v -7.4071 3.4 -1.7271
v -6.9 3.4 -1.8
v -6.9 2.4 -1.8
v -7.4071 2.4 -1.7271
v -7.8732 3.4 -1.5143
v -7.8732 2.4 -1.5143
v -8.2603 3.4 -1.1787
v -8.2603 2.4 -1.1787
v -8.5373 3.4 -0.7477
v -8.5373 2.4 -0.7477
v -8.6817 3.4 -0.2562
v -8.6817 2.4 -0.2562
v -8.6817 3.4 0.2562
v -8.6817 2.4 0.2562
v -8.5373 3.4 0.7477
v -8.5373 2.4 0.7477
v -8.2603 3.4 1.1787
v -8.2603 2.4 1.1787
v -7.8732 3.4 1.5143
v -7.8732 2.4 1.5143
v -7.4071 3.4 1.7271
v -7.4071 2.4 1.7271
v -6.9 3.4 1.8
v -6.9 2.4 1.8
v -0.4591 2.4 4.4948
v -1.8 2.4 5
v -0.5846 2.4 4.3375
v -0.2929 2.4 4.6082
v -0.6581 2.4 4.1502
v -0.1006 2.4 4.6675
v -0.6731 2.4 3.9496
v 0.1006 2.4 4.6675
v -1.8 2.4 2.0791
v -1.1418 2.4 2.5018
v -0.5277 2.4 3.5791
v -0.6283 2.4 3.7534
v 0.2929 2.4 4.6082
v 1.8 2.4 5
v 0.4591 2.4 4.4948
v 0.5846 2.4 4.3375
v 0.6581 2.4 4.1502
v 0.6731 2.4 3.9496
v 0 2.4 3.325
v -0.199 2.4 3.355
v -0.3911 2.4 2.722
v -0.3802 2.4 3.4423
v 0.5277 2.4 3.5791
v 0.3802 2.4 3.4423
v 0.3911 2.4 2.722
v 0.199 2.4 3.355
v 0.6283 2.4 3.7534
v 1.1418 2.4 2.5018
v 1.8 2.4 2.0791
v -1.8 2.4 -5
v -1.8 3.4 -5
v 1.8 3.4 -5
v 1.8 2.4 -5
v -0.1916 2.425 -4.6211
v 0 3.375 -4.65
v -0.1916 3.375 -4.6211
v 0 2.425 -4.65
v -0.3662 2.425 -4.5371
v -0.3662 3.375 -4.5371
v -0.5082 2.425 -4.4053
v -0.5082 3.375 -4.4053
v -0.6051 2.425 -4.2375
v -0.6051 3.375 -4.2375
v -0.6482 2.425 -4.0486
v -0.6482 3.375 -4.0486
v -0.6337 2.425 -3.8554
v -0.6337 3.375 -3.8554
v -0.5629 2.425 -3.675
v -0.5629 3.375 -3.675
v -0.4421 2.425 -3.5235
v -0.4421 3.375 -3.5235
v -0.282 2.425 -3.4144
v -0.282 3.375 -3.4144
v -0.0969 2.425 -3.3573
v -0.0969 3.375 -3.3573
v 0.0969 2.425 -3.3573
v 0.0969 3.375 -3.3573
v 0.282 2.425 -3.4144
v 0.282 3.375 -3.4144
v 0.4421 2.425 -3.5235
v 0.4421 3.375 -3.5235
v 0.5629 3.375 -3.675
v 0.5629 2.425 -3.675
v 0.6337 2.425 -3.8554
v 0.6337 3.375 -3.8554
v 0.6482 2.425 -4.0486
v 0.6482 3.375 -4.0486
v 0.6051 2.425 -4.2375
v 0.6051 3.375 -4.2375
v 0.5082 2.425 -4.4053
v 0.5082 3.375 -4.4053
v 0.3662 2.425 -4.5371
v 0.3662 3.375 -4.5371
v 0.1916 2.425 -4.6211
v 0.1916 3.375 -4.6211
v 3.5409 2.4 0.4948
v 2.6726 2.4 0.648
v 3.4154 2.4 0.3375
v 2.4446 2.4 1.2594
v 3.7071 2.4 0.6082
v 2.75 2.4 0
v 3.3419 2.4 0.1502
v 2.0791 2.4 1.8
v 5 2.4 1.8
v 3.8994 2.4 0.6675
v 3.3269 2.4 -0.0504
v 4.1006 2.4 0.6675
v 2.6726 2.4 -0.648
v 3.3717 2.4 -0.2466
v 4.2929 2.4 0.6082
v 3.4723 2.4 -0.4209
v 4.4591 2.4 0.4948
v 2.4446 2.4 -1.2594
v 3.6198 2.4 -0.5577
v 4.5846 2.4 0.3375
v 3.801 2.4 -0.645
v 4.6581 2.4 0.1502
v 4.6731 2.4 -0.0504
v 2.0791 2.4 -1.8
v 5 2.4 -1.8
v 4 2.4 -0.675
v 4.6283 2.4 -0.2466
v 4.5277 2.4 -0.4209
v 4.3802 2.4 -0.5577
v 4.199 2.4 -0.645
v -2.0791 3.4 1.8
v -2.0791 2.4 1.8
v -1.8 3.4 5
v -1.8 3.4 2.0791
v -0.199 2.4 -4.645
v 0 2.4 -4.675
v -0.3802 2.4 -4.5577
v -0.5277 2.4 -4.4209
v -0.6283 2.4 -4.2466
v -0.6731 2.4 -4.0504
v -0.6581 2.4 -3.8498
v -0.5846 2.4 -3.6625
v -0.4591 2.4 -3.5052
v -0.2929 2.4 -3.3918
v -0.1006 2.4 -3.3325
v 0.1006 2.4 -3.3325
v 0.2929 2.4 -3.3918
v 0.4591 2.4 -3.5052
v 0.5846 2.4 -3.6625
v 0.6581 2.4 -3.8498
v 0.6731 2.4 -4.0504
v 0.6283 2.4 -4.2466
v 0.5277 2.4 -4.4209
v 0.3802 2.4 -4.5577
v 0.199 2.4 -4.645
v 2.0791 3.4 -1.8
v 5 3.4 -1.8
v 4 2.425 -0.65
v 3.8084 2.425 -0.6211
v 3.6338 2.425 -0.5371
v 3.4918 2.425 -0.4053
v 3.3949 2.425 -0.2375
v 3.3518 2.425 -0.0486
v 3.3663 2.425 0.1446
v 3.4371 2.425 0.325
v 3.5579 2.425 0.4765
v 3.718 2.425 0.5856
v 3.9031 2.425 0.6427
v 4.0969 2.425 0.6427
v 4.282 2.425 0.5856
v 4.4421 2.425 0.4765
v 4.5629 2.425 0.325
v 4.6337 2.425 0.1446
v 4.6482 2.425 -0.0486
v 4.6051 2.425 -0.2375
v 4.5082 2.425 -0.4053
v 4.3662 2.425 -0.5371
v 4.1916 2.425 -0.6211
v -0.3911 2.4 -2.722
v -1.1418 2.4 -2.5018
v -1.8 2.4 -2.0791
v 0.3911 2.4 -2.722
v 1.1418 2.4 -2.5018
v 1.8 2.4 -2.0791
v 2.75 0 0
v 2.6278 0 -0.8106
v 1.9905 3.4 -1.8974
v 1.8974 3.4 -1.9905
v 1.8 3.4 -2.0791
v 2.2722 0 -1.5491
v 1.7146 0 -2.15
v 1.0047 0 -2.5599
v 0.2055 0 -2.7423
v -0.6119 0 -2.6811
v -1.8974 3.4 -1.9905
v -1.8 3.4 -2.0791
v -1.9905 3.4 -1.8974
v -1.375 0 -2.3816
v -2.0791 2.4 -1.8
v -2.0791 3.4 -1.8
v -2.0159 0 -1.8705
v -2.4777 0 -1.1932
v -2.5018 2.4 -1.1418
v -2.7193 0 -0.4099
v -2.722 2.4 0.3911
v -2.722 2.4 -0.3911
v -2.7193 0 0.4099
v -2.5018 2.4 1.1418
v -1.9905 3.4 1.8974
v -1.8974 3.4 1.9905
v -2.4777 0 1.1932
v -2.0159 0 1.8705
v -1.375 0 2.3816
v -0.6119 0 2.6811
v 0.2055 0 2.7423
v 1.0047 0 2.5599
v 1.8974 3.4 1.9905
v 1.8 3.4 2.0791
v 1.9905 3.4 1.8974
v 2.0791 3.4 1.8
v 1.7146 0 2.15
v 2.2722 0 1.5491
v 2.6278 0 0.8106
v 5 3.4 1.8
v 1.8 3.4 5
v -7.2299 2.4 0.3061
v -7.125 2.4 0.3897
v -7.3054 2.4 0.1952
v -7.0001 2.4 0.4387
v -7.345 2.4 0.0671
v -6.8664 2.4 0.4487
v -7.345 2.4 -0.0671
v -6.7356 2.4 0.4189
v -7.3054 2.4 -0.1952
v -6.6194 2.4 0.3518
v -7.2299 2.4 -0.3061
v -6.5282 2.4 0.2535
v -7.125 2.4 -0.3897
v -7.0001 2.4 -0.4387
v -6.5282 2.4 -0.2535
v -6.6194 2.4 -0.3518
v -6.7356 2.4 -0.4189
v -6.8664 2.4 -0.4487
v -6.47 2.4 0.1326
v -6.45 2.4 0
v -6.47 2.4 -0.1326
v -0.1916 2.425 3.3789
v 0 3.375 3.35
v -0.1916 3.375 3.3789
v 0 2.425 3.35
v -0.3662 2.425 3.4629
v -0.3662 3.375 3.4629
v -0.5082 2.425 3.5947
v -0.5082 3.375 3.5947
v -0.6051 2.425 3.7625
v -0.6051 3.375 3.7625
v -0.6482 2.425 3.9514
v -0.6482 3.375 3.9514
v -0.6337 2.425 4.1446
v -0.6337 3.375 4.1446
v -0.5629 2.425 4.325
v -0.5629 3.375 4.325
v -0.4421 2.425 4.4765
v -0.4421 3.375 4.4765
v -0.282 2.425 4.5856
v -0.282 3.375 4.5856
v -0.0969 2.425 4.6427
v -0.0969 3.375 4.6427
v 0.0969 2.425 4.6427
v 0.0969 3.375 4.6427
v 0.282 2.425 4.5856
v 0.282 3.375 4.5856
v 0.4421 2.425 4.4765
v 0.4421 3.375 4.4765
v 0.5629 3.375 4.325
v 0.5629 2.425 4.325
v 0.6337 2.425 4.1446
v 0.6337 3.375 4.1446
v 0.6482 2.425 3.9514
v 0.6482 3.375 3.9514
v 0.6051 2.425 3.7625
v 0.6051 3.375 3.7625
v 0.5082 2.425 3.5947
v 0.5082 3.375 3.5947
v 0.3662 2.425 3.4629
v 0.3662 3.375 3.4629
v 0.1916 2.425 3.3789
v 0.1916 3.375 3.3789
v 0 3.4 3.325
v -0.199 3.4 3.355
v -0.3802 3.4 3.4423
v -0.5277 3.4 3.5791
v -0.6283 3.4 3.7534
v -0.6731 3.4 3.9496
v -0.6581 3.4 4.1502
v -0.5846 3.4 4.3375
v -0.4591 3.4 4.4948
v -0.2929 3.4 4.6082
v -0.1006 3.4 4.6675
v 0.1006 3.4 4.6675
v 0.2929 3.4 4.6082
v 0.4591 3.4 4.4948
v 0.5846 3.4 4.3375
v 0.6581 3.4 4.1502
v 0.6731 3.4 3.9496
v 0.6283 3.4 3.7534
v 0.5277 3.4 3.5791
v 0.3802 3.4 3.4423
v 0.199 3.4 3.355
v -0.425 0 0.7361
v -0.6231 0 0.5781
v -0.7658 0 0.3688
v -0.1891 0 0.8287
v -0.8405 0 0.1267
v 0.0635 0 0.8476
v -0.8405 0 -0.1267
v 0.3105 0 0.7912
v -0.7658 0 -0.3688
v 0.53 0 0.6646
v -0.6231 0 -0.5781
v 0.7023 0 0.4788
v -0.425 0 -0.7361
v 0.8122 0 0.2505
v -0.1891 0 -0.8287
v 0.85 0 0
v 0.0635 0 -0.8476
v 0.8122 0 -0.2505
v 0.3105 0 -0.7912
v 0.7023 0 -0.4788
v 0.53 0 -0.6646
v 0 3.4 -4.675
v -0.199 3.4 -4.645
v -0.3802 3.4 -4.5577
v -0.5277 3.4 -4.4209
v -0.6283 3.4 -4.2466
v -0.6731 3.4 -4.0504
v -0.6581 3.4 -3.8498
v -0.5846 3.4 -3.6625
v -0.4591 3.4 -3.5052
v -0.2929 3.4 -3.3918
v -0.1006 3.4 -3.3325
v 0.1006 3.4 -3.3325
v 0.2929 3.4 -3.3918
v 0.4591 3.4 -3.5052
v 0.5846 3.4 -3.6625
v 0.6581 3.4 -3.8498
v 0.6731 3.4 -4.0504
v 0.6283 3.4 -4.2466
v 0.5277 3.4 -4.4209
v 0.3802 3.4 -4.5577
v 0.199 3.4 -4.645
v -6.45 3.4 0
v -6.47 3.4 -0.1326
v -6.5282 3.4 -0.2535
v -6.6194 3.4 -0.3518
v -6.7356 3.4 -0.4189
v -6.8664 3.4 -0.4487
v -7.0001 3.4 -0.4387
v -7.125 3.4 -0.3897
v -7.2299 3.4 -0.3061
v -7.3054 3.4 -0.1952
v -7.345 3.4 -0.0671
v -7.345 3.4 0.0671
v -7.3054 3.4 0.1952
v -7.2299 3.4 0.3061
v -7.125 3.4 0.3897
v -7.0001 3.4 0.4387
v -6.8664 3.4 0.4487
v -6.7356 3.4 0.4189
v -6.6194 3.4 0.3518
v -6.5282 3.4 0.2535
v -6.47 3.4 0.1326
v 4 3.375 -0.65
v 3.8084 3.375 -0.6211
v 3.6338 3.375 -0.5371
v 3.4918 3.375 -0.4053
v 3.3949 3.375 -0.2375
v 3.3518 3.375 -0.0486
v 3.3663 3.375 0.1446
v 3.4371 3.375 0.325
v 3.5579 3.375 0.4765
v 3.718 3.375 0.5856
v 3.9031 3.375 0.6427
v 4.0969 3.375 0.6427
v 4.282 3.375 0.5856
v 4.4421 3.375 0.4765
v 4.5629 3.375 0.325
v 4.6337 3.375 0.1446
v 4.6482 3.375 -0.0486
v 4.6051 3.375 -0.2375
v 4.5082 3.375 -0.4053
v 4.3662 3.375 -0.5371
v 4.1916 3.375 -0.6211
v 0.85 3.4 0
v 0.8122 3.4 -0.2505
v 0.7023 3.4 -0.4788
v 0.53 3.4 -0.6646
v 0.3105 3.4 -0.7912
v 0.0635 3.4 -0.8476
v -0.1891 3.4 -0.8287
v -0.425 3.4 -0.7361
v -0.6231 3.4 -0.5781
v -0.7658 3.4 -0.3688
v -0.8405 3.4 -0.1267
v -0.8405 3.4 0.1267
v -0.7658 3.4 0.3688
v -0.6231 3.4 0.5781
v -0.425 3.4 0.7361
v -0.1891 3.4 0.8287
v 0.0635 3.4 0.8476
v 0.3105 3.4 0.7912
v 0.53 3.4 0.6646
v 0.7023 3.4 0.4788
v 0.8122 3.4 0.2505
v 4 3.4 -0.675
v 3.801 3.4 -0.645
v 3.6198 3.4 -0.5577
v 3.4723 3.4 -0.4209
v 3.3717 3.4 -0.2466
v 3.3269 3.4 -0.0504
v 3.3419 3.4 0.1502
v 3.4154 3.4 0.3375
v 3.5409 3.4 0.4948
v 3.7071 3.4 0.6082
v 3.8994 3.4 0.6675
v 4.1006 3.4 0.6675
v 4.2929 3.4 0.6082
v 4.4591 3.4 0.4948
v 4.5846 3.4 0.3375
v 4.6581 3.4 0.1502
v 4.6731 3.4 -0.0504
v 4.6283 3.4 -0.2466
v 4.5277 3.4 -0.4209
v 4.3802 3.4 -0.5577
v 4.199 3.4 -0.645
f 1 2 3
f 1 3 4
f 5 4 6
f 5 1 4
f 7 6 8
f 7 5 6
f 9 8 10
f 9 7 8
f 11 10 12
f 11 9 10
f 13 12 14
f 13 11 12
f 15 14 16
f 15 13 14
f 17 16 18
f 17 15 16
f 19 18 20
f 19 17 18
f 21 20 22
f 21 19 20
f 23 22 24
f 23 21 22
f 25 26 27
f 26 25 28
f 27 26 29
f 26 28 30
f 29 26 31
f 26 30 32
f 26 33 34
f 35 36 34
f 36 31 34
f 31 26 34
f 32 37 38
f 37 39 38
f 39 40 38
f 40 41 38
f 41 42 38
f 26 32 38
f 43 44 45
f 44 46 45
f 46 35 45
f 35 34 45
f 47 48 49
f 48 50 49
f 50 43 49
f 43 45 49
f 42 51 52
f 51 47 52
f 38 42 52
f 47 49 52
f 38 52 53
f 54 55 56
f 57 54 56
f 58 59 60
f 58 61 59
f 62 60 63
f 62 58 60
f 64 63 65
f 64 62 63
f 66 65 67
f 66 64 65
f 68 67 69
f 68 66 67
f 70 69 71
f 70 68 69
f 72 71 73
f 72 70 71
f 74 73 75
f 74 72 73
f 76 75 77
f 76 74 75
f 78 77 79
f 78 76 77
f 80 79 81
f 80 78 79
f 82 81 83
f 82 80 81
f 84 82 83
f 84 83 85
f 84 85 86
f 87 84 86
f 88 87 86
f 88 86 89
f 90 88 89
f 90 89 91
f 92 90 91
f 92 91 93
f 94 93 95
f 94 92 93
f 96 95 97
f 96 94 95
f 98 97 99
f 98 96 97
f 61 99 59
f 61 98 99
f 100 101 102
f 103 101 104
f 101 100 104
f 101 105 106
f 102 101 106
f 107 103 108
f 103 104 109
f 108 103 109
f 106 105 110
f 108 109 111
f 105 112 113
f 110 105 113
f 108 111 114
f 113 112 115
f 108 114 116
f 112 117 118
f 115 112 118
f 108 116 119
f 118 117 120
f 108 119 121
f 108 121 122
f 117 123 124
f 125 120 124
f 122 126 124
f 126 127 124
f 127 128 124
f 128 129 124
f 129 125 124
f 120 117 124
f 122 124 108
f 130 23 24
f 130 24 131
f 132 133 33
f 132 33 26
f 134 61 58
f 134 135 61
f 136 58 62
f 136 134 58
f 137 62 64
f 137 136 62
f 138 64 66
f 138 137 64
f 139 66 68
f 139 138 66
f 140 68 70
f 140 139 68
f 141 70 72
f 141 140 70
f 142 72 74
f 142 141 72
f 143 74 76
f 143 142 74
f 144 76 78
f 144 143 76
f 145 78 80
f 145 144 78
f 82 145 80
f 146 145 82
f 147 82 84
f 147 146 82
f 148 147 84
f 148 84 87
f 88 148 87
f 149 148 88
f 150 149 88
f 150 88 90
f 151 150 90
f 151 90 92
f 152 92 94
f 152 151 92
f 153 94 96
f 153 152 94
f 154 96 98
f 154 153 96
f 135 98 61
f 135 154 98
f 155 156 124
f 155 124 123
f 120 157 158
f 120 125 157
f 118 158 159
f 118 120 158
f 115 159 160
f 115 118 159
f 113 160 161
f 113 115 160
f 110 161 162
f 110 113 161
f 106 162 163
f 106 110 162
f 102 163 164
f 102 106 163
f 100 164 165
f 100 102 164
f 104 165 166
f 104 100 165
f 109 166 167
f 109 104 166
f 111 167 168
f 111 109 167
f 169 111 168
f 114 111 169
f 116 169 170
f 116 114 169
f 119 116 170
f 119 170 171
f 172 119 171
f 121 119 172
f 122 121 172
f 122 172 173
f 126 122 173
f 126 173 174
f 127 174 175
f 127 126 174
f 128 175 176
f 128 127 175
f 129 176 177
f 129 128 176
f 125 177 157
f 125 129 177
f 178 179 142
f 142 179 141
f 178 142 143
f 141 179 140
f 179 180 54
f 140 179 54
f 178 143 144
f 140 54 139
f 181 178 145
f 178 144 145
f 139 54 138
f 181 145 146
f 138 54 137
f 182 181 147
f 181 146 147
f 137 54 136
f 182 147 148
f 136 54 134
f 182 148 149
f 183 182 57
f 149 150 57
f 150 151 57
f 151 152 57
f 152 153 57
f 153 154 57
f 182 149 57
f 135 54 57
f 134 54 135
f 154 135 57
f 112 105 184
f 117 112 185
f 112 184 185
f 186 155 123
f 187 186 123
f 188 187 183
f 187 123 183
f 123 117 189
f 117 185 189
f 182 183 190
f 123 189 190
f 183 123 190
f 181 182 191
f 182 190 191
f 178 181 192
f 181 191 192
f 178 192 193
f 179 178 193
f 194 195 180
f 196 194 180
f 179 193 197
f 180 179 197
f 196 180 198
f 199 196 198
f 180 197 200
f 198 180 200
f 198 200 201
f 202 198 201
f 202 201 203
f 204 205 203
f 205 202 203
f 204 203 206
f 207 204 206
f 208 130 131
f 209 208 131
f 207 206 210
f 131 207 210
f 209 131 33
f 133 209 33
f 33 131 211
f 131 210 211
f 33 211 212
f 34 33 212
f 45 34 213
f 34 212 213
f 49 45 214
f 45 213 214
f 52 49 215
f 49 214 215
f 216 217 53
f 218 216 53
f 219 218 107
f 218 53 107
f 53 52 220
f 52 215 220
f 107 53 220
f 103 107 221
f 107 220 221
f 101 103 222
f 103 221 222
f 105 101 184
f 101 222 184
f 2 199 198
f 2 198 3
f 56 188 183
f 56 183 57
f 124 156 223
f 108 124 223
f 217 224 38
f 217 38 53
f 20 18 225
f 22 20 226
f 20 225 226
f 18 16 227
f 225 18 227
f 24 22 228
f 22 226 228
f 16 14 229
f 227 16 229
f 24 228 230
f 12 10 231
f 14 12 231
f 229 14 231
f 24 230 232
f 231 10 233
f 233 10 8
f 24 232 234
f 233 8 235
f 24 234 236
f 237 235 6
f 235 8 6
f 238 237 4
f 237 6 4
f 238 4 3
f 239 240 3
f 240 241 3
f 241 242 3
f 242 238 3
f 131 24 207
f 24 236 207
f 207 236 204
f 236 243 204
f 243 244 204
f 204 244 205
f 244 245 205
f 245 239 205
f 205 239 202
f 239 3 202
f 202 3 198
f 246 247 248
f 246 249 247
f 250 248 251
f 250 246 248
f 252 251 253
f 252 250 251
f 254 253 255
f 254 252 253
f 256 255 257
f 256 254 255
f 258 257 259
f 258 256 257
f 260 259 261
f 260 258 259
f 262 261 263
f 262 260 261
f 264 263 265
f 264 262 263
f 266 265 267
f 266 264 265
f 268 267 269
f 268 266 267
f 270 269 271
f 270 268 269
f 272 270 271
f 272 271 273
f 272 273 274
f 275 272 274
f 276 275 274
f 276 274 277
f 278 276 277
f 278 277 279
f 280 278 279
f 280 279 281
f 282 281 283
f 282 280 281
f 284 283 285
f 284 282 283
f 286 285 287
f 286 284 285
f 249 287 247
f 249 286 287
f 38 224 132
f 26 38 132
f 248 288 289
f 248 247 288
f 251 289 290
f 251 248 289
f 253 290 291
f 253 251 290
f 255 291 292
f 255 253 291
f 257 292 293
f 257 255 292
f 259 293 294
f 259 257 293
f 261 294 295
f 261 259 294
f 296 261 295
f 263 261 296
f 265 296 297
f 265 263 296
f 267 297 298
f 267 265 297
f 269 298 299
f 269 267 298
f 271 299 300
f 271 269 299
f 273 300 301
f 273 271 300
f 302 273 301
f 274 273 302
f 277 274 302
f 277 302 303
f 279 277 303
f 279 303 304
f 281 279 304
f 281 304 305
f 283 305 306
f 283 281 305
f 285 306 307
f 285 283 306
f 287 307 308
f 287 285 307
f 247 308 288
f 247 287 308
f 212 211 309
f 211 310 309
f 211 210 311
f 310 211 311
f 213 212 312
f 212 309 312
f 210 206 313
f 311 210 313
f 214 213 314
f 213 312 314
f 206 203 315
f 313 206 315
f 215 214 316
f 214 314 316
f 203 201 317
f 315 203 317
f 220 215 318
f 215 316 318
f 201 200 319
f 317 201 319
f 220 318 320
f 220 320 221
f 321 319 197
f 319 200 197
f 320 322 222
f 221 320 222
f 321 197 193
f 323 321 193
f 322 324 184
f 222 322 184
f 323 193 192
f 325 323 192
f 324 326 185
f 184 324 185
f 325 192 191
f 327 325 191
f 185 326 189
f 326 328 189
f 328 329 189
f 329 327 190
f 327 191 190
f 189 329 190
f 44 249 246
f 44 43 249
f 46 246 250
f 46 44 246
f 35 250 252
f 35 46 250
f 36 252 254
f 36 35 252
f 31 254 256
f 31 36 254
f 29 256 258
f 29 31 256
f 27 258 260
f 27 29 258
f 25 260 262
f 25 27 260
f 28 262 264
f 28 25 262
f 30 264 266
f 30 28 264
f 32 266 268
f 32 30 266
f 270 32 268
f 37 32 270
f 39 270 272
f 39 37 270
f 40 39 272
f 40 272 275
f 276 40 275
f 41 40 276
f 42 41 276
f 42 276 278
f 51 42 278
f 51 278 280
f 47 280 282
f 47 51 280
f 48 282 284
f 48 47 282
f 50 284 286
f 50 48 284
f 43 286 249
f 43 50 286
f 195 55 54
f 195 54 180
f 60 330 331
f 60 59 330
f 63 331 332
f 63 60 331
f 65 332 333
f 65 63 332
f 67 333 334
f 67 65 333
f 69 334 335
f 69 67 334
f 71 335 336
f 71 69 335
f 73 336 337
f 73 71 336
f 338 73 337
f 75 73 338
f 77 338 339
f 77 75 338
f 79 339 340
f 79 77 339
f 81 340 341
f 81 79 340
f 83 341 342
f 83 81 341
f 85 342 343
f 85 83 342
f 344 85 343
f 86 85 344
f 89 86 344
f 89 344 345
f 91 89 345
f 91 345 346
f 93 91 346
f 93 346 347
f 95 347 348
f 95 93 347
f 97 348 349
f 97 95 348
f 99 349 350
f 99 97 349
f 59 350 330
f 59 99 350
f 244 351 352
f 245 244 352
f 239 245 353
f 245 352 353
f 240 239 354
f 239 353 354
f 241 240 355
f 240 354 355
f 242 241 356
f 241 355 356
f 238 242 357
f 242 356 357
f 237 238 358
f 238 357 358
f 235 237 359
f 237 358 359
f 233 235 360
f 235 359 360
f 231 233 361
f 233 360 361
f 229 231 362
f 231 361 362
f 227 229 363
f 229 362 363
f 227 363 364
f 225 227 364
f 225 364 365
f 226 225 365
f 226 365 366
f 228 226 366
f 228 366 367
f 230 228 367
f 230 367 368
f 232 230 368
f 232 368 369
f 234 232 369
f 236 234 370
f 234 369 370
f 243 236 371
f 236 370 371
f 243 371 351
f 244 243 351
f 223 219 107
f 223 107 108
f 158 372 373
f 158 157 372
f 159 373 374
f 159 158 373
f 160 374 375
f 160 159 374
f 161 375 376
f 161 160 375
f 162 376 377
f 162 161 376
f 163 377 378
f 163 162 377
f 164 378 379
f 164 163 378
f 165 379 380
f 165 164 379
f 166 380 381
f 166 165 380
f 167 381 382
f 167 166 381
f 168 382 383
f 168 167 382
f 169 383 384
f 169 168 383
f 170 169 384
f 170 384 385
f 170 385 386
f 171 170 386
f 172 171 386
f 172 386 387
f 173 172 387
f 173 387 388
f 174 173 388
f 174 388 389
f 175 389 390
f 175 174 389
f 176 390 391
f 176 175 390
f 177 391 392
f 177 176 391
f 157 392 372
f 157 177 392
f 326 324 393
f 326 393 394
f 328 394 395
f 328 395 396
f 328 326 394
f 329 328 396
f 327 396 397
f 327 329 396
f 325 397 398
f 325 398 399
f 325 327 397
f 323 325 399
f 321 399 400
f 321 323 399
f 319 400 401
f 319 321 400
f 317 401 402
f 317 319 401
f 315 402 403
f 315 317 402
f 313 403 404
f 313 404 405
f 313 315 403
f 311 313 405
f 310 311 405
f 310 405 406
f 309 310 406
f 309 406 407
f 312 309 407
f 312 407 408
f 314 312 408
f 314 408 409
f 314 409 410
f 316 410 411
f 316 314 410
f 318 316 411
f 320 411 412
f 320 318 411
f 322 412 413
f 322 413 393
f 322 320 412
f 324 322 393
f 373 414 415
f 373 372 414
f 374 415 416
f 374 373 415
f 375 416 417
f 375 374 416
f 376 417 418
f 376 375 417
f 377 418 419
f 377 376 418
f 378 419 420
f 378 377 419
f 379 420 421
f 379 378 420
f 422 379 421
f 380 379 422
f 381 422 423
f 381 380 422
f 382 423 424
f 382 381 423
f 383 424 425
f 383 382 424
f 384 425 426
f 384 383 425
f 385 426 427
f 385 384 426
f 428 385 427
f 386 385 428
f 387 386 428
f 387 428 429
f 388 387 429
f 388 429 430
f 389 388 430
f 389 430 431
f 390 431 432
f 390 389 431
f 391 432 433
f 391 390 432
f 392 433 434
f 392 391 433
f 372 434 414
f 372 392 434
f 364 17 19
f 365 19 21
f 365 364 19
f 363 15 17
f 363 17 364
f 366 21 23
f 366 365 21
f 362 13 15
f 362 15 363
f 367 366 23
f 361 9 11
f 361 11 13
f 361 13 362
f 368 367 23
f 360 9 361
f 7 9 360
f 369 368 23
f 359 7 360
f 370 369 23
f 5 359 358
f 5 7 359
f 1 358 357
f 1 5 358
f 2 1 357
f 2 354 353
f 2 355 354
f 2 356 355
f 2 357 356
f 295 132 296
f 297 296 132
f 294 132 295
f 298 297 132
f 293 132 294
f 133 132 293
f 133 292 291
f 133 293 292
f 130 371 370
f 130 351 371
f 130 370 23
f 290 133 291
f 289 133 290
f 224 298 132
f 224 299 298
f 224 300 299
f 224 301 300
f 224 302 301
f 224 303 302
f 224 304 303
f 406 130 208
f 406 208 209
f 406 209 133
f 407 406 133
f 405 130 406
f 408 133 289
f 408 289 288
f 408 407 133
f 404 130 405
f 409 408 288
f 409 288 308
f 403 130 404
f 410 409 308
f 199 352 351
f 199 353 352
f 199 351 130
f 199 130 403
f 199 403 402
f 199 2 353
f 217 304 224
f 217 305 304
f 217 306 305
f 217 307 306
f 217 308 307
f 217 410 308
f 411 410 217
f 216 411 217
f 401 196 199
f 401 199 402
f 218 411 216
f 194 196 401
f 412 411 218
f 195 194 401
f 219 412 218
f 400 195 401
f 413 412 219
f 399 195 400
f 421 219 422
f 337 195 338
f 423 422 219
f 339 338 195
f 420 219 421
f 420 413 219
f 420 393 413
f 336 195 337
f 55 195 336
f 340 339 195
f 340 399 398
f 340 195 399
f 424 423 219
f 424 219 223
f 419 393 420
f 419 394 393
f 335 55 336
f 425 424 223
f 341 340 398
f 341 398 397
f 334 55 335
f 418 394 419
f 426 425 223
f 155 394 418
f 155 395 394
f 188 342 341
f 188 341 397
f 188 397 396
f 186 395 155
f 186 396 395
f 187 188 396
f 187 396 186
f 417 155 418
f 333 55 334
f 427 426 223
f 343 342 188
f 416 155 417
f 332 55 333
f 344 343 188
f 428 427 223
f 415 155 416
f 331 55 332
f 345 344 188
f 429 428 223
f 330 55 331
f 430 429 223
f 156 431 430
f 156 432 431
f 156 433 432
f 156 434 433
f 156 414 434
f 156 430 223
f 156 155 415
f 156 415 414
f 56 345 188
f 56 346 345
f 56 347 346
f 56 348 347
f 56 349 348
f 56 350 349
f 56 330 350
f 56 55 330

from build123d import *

# Parameters (mm, degrees)
SKETCH_1_R                       = 2.75
SKETCH_1_R_2                     = 0.85
EXTRUDE_1_DEPTH                  = 3.4
SKETCH_2_R                       = 0.45
EXTRUDE_2_DEPTH                  = 1
SKETCH_3_R                       = 0.45
CUT_EXTRUDE_1_DEPTH              = 4.4
HOLE_WIZARD_1_3_1_3_1_AT_2_COUNT = 2
HOLE_WIZARD_1_3_1_3_1_AT_2_PITCH = 5.656854249
HOLE_WIZARD_1_3_1_3_1_AT_3_COUNT = 2
HOLE_WIZARD_1_3_1_3_1_AT_3_PITCH = 8


with BuildPart() as part:
    # Эскиз1 → Бобышка-Вытянуть1 (new body)
    with BuildSketch(Plane(origin=(0, 0, 0), x_dir=(1, 0, 0), z_dir=(0, 1, 0))):
        Circle(SKETCH_1_R)
        Circle(SKETCH_1_R_2, mode=Mode.SUBTRACT)
    extrude(amount=EXTRUDE_1_DEPTH)

    # Эскиз2 → Бобышка-Вытянуть2 (add)
    with BuildSketch(Plane(origin=(0, 3.4, 0), x_dir=(1, 0, 0), z_dir=(0, 1, 0))):
        with BuildLine():
            Line((6.9, 1.8), (2.079062289, 1.8))
            ThreePointArc((2.079062289, 1.8), (2.75, 0), (2.079062289, -1.8))
            Line((2.079062289, -1.8), (6.9, -1.8))
            ThreePointArc((6.9, -1.8), (8.7, 0), (6.9, 1.8))
        make_face()
        with Locations((6.9, 0)):
            Circle(SKETCH_2_R, mode=Mode.SUBTRACT)
        with BuildLine():
            ThreePointArc((-1.8, 2.079062289), (0, 2.75), (1.8, 2.079062289))
            Line((1.8, 2.079062289), (1.8, 6.9))
            ThreePointArc((1.8, 6.9), (0, 8.7), (-1.8, 6.9))
            Line((-1.8, 6.9), (-1.8, 2.079062289))
        make_face()
        with Locations((0, 6.9)):
            Circle(SKETCH_2_R, mode=Mode.SUBTRACT)
        with BuildLine():
            Line((1.8, -6.9), (1.8, -2.079062289))
            ThreePointArc((1.8, -2.079062289), (0, -2.75), (-1.8, -2.079062289))
            Line((-1.8, -2.079062289), (-1.8, -6.9))
            ThreePointArc((-1.8, -6.9), (0, -8.7), (1.8, -6.9))
        make_face()
        with Locations((0, -6.9)):
            Circle(SKETCH_2_R, mode=Mode.SUBTRACT)
        with BuildLine():
            ThreePointArc((-2.079062289, -1.8), (-2.75, 0), (-2.079062289, 1.8))
            Line((-2.079062289, 1.8), (-6.9, 1.8))
            ThreePointArc((-6.9, 1.8), (-8.7, 0), (-6.9, -1.8))
            Line((-6.9, -1.8), (-2.079062289, -1.8))
        make_face()
        with Locations((-6.9, 0)):
            Circle(SKETCH_2_R, mode=Mode.SUBTRACT)
    extrude(amount=-EXTRUDE_2_DEPTH)

    # Эскиз3 → Вырез-Вытянуть1 (cut, through all)
    with BuildSketch(Plane(origin=(0, 3.4, 0), x_dir=(1, 0, 0), z_dir=(0, 1, 0))):
        with BuildLine():
            Line((6.9, 1.8), (5, 1.8))
            Line((5, 1.8), (5, -1.8))
            Line((5, -1.8), (6.9, -1.8))
            ThreePointArc((6.9, -1.8), (8.7, 0), (6.9, 1.8))
        make_face()
        with Locations((6.9, 0)):
            Circle(SKETCH_3_R, mode=Mode.SUBTRACT)
        with BuildLine():
            Line((1.8, -5), (-1.8, -5))
            Line((-1.8, -5), (-1.8, -6.9))
            ThreePointArc((-1.8, -6.9), (0, -8.7), (1.8, -6.9))
            Line((1.8, -6.9), (1.8, -5))
        make_face()
        with Locations((0, -6.9)):
            Circle(SKETCH_3_R, mode=Mode.SUBTRACT)
        with BuildLine():
            Line((-1.8, 6.9), (-1.8, 5))
            Line((-1.8, 5), (1.8, 5))
            Line((1.8, 5), (1.8, 6.9))
            ThreePointArc((1.8, 6.9), (0, 8.7), (-1.8, 6.9))
        make_face()
        with Locations((0, 6.9)):
            Circle(SKETCH_3_R, mode=Mode.SUBTRACT)
    extrude(amount=-CUT_EXTRUDE_1_DEPTH, mode=Mode.SUBTRACT)

    # Эскиз4 → Диаметр отверстия Ø1.3 (1.3)1 (revolve, cut)
    with BuildSketch(Plane(origin=(0, 2.4, -4), x_dir=(0, 0, -1), z_dir=(1, 0, 0))):
        Polygon((0, 0), (0, 1), (0.675, 1), (0.65, 0.975), (0.65, 0.025), (0.675, 0), align=None)
    hole_wizard_1_3_1_3_1 = revolve(axis=Axis((0, -3.95, -4), (0, 1, 0)), mode=Mode.SUBTRACT)

    # Диаметр отверстия Ø1.3 (1.3)1 at 2: Диаметр отверстия Ø1.3 (1.3)1 ×2
    with Locations(*[Vector(0.707106781, 0, 0.707106781) * (i * HOLE_WIZARD_1_3_1_3_1_AT_2_PITCH) for i in range(1, HOLE_WIZARD_1_3_1_3_1_AT_2_COUNT)]):
        add(hole_wizard_1_3_1_3_1, mode=Mode.SUBTRACT)

    # Диаметр отверстия Ø1.3 (1.3)1 at 3: Диаметр отверстия Ø1.3 (1.3)1 ×2
    with Locations(*[(0, 0, i * HOLE_WIZARD_1_3_1_3_1_AT_3_PITCH) for i in range(1, HOLE_WIZARD_1_3_1_3_1_AT_3_COUNT)]):
        add(hole_wizard_1_3_1_3_1, mode=Mode.SUBTRACT)


solid = part.part
